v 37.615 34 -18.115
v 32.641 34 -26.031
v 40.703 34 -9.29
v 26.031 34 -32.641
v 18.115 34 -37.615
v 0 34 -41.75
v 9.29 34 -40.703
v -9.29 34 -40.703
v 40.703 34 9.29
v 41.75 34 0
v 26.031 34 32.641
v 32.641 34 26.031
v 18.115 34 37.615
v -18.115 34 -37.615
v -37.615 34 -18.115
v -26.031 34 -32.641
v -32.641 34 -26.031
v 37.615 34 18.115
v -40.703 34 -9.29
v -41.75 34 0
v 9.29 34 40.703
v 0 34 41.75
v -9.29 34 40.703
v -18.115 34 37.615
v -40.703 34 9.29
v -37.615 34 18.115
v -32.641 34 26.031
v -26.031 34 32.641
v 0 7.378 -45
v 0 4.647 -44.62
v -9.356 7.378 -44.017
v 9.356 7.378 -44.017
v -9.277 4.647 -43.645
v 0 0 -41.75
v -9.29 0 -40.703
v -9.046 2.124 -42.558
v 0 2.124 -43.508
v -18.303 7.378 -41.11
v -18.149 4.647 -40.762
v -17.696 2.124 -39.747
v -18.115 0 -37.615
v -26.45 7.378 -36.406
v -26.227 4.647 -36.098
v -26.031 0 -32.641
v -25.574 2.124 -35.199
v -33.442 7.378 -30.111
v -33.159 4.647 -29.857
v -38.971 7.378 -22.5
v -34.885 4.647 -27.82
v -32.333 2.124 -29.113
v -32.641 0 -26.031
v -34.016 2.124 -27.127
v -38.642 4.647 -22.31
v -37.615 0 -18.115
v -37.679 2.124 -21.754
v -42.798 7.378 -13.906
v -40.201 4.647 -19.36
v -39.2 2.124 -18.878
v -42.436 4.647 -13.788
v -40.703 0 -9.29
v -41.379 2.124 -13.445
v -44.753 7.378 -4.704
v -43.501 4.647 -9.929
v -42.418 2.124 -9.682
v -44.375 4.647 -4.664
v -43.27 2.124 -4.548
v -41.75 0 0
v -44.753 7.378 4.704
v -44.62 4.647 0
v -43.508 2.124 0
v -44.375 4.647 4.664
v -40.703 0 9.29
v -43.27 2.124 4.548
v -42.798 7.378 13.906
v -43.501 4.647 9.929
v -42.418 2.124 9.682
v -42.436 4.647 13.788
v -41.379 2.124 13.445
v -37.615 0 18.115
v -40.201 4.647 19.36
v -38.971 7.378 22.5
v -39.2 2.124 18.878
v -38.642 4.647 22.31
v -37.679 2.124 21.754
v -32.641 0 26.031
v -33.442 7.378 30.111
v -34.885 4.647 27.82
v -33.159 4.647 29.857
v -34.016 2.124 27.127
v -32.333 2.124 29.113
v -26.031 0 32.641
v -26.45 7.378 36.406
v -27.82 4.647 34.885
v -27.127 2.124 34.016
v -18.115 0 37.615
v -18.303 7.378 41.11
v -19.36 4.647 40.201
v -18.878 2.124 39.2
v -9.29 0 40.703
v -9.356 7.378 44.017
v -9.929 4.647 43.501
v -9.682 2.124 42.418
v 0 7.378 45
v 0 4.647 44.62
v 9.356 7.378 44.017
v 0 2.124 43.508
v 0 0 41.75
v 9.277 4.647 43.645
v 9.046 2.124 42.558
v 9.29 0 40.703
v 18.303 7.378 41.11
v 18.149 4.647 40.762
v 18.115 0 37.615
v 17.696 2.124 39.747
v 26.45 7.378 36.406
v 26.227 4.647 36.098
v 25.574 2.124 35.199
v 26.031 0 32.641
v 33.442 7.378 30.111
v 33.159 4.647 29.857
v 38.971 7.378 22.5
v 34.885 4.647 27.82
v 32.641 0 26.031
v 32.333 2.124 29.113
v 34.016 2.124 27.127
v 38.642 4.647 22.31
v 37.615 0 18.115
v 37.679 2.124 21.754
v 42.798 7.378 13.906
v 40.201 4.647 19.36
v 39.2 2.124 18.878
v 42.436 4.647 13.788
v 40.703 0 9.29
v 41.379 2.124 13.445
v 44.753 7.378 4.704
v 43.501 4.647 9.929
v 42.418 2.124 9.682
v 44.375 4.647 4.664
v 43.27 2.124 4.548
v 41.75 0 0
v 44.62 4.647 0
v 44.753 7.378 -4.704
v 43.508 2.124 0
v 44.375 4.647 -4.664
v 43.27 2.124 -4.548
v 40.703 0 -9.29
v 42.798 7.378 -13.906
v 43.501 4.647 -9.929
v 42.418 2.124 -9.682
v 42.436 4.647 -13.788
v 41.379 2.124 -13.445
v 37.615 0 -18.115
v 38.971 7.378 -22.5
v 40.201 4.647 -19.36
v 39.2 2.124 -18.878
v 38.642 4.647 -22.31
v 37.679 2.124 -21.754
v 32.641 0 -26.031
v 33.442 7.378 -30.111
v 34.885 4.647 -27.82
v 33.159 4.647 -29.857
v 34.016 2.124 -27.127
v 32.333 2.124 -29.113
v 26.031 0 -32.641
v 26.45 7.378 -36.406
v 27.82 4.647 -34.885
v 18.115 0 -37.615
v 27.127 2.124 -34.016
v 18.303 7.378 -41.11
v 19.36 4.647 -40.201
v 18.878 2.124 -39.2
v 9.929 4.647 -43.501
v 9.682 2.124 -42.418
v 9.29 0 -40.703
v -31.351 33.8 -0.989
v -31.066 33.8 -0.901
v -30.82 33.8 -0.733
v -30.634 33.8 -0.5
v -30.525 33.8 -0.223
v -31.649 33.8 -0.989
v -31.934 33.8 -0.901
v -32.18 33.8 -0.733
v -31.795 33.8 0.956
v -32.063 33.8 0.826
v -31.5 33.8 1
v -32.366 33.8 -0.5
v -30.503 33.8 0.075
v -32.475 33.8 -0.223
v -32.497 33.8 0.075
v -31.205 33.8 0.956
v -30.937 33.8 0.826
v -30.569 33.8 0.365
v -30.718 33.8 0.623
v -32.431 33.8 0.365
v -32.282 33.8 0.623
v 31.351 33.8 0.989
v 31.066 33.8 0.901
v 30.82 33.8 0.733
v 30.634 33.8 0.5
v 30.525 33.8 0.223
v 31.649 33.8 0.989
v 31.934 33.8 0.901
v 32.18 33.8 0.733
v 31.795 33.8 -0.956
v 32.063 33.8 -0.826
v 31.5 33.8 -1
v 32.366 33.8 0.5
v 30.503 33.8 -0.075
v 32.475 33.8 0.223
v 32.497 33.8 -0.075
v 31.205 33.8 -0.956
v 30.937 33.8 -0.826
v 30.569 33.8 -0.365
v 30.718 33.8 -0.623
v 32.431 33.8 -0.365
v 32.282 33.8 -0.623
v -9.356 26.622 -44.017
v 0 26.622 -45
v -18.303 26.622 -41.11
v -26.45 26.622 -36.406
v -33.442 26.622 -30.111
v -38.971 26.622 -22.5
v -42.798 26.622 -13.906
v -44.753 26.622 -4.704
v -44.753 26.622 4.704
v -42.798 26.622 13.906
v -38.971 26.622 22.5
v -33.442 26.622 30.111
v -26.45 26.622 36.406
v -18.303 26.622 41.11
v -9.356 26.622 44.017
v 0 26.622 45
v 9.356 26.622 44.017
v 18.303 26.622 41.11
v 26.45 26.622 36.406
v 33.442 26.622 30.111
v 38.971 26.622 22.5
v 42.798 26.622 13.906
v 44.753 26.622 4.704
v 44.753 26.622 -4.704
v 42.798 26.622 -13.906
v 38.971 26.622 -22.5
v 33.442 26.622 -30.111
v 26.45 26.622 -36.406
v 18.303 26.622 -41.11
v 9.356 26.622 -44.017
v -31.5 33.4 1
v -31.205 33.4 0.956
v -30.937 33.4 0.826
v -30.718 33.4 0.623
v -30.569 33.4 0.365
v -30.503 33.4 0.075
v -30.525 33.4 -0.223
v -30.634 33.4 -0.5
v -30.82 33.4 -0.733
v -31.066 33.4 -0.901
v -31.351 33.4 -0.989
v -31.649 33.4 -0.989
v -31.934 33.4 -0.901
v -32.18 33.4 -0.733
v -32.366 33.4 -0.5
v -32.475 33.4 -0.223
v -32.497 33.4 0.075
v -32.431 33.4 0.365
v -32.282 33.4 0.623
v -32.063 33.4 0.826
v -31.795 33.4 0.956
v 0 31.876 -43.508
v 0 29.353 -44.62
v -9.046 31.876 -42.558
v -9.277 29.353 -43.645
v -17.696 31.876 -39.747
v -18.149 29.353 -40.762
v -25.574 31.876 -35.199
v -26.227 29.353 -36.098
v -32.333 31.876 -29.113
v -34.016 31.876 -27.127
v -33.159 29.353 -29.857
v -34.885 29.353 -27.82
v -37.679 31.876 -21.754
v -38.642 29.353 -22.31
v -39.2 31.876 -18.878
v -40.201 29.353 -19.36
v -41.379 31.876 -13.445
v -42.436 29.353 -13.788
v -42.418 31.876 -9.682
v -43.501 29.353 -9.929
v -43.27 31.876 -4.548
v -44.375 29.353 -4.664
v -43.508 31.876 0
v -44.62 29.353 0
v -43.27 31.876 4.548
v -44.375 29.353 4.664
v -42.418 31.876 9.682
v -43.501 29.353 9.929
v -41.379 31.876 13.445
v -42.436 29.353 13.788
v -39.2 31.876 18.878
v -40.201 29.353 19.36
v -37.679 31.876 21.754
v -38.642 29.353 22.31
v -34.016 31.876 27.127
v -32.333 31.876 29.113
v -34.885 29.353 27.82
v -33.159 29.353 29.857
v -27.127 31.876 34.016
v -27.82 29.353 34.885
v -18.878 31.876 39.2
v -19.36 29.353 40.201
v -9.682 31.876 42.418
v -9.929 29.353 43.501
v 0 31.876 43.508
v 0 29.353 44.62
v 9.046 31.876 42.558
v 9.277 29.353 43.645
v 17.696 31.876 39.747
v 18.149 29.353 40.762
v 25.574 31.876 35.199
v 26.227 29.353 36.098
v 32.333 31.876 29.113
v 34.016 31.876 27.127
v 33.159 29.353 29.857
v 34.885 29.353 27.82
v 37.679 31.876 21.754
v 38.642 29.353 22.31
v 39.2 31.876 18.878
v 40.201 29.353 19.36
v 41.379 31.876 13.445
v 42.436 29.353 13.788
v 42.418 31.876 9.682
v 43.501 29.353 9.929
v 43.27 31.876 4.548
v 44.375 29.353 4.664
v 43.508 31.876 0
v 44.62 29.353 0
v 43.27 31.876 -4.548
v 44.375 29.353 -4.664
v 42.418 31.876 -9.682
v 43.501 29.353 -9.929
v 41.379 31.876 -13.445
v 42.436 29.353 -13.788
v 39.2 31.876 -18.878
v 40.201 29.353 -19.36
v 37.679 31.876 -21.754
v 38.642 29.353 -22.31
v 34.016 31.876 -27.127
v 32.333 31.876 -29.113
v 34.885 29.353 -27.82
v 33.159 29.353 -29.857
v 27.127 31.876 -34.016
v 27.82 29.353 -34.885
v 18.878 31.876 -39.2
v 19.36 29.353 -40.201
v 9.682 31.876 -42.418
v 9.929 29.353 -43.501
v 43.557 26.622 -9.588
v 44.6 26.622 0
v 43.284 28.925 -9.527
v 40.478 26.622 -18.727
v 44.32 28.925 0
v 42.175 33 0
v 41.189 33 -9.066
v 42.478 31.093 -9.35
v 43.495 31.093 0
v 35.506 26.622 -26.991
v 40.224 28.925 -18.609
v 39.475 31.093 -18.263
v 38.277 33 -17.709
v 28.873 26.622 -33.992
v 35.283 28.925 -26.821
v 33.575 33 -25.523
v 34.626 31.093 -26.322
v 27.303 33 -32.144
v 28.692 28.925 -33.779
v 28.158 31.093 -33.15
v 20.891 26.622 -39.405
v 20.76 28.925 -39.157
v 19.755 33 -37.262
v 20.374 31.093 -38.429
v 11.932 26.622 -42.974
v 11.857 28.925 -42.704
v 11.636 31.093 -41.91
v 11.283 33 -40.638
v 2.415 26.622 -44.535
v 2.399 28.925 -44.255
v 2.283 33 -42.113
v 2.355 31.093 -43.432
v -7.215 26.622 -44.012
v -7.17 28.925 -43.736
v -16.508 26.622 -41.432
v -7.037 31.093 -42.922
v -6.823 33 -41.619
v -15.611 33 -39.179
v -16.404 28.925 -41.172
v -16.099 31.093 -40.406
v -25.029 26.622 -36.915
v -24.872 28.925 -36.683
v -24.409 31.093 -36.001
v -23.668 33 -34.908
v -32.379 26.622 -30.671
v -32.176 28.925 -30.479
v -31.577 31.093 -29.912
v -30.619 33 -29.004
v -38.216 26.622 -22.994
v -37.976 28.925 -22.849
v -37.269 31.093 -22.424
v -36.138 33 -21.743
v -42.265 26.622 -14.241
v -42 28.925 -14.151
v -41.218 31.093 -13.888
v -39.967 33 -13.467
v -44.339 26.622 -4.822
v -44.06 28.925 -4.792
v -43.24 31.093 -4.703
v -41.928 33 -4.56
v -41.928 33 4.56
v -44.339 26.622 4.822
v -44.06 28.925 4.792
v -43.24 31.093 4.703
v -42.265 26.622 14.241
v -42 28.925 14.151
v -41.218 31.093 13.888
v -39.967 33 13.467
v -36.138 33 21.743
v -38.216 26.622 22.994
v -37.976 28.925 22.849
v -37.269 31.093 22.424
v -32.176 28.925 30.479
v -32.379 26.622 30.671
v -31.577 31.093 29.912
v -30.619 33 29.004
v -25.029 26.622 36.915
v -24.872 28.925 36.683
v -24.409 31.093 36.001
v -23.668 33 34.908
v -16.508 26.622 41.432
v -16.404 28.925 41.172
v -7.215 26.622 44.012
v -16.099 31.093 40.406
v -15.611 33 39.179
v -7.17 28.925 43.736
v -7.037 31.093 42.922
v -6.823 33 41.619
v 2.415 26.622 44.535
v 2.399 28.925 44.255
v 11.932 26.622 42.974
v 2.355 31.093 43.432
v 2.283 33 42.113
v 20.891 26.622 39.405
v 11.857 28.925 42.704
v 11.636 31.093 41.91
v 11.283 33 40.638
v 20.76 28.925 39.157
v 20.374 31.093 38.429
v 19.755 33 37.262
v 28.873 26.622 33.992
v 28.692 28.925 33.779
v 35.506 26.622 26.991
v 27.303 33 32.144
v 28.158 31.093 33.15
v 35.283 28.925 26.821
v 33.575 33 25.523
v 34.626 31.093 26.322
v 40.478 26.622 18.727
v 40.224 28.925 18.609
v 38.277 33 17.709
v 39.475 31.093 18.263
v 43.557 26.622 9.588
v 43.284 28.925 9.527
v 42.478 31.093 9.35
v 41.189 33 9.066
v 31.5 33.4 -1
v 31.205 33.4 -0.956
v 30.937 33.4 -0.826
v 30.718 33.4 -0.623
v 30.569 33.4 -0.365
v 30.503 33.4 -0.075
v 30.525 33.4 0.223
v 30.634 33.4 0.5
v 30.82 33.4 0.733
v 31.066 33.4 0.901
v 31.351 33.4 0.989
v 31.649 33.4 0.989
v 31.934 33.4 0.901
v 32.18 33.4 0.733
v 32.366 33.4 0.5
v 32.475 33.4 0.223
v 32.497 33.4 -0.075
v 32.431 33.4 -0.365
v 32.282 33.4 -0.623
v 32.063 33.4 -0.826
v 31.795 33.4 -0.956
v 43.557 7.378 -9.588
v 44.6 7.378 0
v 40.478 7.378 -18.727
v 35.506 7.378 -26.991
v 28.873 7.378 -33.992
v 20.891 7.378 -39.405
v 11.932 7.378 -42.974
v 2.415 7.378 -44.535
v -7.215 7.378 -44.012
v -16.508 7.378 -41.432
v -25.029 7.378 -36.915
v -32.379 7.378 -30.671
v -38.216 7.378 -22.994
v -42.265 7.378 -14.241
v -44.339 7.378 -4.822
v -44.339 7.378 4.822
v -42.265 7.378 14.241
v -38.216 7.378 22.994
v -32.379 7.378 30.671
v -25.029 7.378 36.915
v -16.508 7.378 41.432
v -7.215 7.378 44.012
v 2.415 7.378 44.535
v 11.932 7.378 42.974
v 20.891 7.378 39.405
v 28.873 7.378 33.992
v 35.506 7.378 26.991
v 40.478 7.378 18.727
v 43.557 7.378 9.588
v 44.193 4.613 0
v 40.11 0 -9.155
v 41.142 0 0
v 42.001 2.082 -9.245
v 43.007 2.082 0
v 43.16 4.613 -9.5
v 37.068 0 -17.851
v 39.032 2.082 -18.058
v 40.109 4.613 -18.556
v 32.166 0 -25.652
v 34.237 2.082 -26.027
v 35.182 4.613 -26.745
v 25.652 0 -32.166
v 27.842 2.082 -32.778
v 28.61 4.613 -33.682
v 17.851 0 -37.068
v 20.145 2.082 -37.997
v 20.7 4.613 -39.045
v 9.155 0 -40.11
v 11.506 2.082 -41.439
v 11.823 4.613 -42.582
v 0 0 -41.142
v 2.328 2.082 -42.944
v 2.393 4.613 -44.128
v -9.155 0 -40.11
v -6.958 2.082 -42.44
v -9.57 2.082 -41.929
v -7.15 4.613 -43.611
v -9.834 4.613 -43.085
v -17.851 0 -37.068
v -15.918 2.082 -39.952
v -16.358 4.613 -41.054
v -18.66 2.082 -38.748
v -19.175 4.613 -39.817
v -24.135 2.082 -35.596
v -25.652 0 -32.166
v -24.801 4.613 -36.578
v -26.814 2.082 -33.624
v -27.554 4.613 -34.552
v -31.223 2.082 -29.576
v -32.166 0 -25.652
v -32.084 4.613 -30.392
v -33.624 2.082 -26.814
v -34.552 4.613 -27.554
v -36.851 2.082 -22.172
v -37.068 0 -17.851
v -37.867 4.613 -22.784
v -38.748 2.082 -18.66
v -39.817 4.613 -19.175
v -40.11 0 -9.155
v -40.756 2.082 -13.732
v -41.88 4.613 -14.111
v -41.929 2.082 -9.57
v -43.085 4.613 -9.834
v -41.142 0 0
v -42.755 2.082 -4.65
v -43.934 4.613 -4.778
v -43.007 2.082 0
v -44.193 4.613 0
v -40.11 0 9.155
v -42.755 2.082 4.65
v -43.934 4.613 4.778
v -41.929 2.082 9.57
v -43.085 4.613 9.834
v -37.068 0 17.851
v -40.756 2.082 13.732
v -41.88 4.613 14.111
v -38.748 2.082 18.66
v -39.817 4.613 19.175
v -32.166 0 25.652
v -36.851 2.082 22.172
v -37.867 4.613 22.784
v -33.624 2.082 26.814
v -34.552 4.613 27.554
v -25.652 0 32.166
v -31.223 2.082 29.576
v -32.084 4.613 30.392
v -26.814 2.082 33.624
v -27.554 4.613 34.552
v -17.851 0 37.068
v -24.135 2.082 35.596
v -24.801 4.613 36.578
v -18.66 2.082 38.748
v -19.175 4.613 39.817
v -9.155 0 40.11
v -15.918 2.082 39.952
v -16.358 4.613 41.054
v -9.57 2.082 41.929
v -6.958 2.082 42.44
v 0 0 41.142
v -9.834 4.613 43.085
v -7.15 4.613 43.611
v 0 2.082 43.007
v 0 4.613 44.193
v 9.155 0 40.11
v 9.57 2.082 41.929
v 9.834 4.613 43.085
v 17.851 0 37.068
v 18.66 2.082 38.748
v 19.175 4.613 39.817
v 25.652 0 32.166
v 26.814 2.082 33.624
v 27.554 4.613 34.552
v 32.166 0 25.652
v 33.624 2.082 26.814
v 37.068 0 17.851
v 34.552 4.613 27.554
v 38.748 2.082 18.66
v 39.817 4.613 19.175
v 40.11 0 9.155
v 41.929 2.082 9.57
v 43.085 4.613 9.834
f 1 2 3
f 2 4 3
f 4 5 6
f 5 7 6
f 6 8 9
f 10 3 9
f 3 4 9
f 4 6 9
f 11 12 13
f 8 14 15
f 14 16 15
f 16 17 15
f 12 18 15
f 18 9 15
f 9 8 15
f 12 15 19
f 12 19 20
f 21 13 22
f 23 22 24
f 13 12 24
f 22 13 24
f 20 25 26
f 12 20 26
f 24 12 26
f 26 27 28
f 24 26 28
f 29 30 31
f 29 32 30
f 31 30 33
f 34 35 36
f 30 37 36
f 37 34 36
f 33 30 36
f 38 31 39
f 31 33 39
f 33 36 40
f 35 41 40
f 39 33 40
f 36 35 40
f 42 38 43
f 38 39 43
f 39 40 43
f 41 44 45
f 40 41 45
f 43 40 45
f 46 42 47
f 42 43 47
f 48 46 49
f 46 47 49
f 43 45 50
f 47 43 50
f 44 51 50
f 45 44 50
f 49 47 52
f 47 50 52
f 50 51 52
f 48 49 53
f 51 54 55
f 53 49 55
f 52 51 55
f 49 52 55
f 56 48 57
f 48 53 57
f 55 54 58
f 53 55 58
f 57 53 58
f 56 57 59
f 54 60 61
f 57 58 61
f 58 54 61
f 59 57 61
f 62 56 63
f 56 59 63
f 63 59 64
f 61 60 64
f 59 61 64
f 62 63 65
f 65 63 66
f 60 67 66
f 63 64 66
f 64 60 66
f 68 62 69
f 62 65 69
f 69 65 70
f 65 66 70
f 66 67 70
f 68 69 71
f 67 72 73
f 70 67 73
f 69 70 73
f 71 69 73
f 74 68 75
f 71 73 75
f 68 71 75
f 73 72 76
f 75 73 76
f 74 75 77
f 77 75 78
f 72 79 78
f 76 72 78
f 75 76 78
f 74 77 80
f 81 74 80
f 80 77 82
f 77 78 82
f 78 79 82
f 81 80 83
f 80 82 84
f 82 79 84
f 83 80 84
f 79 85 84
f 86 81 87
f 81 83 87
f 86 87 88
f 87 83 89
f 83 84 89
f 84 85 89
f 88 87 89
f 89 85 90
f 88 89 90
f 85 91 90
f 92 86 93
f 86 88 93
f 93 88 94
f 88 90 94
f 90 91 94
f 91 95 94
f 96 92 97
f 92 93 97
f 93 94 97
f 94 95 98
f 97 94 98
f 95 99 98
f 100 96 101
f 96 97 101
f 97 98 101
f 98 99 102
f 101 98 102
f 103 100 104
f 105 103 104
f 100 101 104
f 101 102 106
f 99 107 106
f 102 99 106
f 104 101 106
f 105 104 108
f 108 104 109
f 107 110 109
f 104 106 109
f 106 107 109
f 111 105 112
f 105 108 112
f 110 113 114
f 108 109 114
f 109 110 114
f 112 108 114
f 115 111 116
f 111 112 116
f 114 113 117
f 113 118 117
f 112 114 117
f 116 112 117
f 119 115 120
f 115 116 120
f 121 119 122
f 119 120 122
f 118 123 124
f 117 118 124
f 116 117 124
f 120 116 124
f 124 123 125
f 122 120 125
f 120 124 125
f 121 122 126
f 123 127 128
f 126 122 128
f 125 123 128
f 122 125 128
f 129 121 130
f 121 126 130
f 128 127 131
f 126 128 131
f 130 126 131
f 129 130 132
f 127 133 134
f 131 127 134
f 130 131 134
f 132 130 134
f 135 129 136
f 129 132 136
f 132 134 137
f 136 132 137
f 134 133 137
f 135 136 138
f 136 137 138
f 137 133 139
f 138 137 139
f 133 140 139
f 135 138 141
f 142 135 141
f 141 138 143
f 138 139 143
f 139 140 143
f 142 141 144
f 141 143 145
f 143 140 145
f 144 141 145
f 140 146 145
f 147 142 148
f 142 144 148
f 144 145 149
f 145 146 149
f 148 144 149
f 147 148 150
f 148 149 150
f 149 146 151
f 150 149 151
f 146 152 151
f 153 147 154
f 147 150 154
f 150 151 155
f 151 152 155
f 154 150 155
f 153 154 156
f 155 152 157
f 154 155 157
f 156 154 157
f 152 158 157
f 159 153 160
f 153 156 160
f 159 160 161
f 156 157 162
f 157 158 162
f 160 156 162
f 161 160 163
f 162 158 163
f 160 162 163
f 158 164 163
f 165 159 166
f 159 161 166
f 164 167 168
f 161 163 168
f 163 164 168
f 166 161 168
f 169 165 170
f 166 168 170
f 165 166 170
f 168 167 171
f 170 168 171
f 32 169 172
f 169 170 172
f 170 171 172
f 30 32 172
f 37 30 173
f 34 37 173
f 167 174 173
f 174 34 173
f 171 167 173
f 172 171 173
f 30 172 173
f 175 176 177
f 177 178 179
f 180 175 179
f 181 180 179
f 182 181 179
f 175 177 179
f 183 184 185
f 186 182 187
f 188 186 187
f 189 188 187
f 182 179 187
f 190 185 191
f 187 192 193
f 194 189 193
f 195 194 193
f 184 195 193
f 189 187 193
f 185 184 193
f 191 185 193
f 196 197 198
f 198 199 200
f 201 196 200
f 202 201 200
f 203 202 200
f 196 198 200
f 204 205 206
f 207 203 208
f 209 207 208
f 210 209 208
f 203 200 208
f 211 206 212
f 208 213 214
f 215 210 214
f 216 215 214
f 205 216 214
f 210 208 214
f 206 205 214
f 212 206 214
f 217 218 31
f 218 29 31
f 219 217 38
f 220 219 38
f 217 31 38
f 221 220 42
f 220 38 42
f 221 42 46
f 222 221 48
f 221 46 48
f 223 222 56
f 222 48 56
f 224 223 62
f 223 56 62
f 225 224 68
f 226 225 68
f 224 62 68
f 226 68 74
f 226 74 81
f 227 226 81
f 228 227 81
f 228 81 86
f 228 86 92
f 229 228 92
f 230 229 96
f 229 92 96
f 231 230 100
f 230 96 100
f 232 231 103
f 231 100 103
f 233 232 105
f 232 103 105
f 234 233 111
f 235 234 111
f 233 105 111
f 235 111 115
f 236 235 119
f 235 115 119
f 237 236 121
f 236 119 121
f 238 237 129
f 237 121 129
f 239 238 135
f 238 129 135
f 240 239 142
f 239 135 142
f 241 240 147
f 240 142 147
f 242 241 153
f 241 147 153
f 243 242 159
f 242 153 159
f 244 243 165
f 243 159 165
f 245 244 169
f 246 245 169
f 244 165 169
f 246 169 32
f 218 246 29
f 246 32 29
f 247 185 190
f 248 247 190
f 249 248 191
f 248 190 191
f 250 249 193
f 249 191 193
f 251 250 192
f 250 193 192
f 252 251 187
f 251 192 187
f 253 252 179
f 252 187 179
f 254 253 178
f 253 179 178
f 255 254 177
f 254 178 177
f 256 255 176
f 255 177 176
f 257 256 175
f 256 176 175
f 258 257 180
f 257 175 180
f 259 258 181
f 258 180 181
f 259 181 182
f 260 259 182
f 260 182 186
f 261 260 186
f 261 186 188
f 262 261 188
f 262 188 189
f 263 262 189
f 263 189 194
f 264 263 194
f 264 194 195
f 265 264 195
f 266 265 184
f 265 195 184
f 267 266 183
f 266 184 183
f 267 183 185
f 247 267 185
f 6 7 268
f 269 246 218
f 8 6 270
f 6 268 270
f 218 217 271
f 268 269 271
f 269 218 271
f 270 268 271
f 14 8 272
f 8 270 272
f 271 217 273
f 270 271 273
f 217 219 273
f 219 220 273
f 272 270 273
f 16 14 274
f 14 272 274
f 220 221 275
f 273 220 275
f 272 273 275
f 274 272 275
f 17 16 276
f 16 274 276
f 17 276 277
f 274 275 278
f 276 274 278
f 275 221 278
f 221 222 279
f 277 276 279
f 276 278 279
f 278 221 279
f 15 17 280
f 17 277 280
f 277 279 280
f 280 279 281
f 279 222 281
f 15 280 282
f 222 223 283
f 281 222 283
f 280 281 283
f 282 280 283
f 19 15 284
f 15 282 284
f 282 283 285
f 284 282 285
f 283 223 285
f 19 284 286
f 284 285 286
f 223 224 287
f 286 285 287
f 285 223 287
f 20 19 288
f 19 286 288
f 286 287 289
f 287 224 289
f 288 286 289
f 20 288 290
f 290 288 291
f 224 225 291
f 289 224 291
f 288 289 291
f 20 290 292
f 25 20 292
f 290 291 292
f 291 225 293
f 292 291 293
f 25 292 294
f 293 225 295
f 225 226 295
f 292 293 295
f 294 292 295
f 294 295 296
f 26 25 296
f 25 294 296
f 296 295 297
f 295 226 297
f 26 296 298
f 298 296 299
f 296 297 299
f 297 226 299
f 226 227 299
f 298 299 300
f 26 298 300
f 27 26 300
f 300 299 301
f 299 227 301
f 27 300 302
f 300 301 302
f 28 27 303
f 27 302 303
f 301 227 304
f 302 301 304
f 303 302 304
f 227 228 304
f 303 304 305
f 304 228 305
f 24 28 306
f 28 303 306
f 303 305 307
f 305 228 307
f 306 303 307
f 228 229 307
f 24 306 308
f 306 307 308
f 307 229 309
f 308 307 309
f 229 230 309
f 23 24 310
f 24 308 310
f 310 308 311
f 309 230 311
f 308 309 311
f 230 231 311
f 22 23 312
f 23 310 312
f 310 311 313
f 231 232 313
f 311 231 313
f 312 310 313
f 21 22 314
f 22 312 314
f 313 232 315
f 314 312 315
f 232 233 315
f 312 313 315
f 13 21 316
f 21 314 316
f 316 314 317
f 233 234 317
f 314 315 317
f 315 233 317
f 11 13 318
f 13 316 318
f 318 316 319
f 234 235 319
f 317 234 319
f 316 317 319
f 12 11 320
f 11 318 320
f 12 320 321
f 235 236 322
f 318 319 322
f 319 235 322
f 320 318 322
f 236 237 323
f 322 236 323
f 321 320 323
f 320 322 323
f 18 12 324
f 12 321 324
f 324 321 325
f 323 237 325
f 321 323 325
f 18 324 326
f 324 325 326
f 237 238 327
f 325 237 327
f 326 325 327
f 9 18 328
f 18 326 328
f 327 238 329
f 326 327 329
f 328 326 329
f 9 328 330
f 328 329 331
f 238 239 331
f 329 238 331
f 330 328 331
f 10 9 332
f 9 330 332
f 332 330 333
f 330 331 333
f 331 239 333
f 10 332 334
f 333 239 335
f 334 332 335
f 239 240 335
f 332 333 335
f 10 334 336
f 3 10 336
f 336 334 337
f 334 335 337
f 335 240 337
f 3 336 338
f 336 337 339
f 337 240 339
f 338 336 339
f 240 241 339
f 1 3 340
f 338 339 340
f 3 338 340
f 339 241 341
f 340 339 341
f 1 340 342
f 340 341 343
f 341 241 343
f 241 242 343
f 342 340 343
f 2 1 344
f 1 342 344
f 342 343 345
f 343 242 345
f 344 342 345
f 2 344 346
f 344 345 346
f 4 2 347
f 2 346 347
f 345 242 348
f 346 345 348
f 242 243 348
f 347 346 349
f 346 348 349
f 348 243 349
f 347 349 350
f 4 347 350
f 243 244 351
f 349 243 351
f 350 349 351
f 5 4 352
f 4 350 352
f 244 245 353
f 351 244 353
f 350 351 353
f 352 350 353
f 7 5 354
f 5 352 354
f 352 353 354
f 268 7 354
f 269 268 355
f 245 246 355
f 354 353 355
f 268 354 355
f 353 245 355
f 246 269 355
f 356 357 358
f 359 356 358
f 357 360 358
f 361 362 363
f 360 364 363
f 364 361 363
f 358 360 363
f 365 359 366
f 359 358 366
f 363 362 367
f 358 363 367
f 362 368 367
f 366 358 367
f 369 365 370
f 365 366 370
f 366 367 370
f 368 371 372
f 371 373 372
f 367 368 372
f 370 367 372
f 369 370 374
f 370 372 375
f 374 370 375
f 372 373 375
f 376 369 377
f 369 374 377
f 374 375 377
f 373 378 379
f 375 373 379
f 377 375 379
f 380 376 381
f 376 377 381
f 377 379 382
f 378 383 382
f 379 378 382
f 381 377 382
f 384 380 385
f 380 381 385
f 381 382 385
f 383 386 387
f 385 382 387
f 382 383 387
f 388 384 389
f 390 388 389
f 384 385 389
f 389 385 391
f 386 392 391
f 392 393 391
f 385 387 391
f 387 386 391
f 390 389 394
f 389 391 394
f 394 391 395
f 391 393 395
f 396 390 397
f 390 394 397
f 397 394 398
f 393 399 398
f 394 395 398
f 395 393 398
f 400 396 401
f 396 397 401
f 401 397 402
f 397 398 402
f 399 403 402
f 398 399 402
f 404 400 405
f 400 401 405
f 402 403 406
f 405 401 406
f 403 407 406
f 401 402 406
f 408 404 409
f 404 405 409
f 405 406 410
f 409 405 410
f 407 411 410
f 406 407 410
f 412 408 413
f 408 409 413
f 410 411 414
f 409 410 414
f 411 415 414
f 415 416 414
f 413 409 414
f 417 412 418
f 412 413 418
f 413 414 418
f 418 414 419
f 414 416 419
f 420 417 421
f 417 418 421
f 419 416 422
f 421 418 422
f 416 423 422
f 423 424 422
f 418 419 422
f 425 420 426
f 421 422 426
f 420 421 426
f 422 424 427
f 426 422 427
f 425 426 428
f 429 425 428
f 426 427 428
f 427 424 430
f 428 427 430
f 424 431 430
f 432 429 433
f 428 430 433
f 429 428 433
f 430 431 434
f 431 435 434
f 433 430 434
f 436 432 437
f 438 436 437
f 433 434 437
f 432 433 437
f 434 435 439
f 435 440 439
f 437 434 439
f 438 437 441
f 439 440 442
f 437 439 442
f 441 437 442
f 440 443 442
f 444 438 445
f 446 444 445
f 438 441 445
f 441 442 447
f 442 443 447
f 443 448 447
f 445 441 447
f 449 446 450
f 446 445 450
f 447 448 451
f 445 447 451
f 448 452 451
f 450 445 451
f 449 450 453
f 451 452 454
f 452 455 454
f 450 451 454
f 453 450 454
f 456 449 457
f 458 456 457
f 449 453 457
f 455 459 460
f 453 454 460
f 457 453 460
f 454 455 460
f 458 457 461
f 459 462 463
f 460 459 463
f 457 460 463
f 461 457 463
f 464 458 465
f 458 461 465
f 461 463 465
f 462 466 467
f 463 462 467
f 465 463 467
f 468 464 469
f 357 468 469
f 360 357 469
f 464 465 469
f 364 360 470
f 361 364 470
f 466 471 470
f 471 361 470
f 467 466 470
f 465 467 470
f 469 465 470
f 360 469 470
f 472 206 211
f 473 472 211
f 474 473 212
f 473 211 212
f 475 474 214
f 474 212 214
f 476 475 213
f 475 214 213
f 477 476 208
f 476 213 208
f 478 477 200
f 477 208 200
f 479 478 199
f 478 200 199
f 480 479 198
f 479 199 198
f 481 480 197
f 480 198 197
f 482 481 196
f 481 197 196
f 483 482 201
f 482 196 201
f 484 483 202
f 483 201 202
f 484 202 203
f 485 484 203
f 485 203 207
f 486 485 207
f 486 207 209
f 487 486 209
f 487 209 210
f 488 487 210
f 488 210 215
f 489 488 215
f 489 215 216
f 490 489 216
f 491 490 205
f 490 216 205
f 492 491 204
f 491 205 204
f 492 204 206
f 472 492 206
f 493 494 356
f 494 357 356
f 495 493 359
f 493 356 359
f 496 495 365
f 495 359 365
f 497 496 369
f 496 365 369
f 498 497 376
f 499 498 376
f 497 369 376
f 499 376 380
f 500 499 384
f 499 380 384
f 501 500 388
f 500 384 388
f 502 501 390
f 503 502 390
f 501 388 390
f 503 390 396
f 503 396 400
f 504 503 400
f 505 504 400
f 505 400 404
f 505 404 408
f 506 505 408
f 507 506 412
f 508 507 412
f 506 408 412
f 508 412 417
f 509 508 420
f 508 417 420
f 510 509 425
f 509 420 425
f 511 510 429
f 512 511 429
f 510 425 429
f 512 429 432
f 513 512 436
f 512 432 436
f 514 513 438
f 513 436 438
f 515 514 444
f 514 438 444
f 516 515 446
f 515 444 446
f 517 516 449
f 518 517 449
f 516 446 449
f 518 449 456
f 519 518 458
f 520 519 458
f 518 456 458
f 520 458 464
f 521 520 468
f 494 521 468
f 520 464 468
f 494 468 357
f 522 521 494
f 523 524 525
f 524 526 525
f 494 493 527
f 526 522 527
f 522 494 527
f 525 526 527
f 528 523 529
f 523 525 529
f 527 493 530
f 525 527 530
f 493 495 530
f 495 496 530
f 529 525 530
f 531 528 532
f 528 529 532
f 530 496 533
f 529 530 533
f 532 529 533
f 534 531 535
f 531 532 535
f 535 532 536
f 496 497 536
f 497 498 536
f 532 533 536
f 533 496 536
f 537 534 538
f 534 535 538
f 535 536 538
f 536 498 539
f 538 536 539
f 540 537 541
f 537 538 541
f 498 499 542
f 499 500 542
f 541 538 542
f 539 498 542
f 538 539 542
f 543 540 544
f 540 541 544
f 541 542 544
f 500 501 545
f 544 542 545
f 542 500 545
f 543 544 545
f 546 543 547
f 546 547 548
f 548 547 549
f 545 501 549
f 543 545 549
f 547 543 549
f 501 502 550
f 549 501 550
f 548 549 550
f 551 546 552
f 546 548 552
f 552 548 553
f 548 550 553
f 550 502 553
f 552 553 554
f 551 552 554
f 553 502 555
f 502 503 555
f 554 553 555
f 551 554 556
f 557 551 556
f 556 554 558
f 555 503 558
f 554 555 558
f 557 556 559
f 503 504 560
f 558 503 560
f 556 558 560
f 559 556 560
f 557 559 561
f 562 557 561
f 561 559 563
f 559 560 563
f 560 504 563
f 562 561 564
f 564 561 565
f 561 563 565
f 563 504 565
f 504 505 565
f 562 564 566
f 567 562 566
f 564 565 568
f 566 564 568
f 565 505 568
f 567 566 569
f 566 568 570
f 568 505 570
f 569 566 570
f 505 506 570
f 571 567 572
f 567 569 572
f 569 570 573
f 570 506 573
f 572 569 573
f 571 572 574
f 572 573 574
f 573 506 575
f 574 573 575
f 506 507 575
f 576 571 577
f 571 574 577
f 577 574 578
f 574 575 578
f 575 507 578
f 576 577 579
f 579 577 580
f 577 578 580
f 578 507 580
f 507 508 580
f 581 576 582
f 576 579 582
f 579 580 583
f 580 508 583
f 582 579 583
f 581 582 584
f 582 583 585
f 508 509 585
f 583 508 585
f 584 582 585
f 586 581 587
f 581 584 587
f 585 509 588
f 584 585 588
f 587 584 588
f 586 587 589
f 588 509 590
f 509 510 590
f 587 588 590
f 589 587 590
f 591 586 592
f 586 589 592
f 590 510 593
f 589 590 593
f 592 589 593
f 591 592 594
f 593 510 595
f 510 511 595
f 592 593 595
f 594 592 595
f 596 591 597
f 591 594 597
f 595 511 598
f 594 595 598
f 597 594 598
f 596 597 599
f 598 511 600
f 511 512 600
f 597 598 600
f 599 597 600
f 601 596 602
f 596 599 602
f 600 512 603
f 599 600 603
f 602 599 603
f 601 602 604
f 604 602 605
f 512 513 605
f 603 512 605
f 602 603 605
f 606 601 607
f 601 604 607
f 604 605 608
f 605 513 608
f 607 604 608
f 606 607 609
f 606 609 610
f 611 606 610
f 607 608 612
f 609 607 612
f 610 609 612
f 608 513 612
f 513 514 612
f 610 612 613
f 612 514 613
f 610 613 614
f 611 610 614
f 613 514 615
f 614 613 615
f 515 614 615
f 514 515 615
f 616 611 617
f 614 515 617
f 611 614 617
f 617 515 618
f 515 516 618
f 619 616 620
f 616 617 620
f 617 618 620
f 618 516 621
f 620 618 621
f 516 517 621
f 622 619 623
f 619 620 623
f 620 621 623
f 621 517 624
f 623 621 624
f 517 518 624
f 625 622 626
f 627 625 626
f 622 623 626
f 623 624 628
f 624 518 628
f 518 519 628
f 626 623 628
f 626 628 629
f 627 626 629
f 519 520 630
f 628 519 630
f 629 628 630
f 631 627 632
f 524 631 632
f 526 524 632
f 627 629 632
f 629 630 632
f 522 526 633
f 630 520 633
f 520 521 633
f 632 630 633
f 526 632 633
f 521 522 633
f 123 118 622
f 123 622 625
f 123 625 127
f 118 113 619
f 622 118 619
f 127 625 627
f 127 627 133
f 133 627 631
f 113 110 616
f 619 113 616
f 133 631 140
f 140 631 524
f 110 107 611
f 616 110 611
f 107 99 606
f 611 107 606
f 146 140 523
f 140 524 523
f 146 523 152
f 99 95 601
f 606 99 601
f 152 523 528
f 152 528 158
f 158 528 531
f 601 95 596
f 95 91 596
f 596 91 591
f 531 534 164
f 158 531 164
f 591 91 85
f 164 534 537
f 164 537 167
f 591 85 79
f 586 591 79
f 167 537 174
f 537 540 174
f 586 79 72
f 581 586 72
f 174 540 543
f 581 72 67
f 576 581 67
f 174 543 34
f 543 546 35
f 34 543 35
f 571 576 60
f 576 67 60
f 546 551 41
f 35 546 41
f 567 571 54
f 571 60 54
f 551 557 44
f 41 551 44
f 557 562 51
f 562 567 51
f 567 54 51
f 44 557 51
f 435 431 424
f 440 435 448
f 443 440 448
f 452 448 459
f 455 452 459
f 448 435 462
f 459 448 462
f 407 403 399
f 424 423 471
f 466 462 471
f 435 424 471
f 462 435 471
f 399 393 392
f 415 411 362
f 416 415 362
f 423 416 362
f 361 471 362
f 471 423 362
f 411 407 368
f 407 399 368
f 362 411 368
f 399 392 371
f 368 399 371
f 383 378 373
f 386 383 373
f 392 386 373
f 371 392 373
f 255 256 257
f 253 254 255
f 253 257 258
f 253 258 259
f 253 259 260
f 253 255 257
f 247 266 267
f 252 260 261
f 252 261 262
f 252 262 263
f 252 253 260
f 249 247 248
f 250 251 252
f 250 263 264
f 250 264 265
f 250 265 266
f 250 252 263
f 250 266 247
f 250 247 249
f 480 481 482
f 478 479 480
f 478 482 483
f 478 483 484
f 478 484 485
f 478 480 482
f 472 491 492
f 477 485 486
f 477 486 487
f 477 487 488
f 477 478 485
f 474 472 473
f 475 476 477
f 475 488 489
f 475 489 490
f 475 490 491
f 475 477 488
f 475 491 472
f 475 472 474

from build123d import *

# Parameters (mm, degrees)
ENL_V_START             = -0.2
ESQUISSE2_R             = 1
ENL_V_MAT_EXTRU_1_DEPTH = 0.4


# Read off the part's stored shape, not the designer's step: Coque1
with BuildPart() as part:
    # Esquisse1 → Révolution1 (revolve)
    with BuildSketch(Plane.XY, mode=Mode.PRIVATE) as r_volution1_sk:
        with BuildLine():
            Line((0, 0), (0, 34))
            Line((0, 34), (41.75, 34))
            ThreePointArc((41.75, 34), (44.151502609, 30.652951592), (45, 26.621822718))
            Line((45, 26.621822718), (45, 7.378177282))
            ThreePointArc((45, 7.378177282), (44.151502609, 3.347048408), (41.75, 0))
            Line((41.75, 0), (0, 0))
        make_face()
    revolve(r_volution1_sk.sketch.rotate(Axis((0, 34, 0), (0, 1, 0)), 90), axis=Axis((0, 34, 0), (0, 1, 0)))

    # Coque1 outline → Coque1 (revolve, cut)
    with BuildSketch(Plane.XY):
        with BuildLine():
            Line((44.6, 7.378177282), (44.6, 26.621822718))
            ThreePointArc((44.6, 26.621822718), (43.973260711, 30.033653928), (42.174876624, 33))
            Line((42.174876624, 33), (0, 33))
            Line((0, 33), (0, 0))
            Line((0, 0), (41.141864538, 0))
            ThreePointArc((41.141864538, 0), (43.692580157, 3.303984083), (44.6, 7.378177282))
        make_face()
    revolve(axis=Axis((0, 0, 0), (0, 1, 0)), mode=Mode.SUBTRACT)

    # Esquisse2 → Enlèv. mat.-Extru.1 (cut)
    with BuildSketch(Plane(origin=(0, 34, 0), x_dir=(1, 0, 0), z_dir=(0, 1, 0)).offset(ENL_V_START)):
        with Locations(Location((-31.5, 0, 0), (0, 0, 270))):
            Circle(ESQUISSE2_R)
        with Locations(Location((31.5, 0, 0), (0, 0, 90))):
            Circle(ESQUISSE2_R)
    extrude(amount=-ENL_V_MAT_EXTRU_1_DEPTH, mode=Mode.SUBTRACT)


solid = part.part
